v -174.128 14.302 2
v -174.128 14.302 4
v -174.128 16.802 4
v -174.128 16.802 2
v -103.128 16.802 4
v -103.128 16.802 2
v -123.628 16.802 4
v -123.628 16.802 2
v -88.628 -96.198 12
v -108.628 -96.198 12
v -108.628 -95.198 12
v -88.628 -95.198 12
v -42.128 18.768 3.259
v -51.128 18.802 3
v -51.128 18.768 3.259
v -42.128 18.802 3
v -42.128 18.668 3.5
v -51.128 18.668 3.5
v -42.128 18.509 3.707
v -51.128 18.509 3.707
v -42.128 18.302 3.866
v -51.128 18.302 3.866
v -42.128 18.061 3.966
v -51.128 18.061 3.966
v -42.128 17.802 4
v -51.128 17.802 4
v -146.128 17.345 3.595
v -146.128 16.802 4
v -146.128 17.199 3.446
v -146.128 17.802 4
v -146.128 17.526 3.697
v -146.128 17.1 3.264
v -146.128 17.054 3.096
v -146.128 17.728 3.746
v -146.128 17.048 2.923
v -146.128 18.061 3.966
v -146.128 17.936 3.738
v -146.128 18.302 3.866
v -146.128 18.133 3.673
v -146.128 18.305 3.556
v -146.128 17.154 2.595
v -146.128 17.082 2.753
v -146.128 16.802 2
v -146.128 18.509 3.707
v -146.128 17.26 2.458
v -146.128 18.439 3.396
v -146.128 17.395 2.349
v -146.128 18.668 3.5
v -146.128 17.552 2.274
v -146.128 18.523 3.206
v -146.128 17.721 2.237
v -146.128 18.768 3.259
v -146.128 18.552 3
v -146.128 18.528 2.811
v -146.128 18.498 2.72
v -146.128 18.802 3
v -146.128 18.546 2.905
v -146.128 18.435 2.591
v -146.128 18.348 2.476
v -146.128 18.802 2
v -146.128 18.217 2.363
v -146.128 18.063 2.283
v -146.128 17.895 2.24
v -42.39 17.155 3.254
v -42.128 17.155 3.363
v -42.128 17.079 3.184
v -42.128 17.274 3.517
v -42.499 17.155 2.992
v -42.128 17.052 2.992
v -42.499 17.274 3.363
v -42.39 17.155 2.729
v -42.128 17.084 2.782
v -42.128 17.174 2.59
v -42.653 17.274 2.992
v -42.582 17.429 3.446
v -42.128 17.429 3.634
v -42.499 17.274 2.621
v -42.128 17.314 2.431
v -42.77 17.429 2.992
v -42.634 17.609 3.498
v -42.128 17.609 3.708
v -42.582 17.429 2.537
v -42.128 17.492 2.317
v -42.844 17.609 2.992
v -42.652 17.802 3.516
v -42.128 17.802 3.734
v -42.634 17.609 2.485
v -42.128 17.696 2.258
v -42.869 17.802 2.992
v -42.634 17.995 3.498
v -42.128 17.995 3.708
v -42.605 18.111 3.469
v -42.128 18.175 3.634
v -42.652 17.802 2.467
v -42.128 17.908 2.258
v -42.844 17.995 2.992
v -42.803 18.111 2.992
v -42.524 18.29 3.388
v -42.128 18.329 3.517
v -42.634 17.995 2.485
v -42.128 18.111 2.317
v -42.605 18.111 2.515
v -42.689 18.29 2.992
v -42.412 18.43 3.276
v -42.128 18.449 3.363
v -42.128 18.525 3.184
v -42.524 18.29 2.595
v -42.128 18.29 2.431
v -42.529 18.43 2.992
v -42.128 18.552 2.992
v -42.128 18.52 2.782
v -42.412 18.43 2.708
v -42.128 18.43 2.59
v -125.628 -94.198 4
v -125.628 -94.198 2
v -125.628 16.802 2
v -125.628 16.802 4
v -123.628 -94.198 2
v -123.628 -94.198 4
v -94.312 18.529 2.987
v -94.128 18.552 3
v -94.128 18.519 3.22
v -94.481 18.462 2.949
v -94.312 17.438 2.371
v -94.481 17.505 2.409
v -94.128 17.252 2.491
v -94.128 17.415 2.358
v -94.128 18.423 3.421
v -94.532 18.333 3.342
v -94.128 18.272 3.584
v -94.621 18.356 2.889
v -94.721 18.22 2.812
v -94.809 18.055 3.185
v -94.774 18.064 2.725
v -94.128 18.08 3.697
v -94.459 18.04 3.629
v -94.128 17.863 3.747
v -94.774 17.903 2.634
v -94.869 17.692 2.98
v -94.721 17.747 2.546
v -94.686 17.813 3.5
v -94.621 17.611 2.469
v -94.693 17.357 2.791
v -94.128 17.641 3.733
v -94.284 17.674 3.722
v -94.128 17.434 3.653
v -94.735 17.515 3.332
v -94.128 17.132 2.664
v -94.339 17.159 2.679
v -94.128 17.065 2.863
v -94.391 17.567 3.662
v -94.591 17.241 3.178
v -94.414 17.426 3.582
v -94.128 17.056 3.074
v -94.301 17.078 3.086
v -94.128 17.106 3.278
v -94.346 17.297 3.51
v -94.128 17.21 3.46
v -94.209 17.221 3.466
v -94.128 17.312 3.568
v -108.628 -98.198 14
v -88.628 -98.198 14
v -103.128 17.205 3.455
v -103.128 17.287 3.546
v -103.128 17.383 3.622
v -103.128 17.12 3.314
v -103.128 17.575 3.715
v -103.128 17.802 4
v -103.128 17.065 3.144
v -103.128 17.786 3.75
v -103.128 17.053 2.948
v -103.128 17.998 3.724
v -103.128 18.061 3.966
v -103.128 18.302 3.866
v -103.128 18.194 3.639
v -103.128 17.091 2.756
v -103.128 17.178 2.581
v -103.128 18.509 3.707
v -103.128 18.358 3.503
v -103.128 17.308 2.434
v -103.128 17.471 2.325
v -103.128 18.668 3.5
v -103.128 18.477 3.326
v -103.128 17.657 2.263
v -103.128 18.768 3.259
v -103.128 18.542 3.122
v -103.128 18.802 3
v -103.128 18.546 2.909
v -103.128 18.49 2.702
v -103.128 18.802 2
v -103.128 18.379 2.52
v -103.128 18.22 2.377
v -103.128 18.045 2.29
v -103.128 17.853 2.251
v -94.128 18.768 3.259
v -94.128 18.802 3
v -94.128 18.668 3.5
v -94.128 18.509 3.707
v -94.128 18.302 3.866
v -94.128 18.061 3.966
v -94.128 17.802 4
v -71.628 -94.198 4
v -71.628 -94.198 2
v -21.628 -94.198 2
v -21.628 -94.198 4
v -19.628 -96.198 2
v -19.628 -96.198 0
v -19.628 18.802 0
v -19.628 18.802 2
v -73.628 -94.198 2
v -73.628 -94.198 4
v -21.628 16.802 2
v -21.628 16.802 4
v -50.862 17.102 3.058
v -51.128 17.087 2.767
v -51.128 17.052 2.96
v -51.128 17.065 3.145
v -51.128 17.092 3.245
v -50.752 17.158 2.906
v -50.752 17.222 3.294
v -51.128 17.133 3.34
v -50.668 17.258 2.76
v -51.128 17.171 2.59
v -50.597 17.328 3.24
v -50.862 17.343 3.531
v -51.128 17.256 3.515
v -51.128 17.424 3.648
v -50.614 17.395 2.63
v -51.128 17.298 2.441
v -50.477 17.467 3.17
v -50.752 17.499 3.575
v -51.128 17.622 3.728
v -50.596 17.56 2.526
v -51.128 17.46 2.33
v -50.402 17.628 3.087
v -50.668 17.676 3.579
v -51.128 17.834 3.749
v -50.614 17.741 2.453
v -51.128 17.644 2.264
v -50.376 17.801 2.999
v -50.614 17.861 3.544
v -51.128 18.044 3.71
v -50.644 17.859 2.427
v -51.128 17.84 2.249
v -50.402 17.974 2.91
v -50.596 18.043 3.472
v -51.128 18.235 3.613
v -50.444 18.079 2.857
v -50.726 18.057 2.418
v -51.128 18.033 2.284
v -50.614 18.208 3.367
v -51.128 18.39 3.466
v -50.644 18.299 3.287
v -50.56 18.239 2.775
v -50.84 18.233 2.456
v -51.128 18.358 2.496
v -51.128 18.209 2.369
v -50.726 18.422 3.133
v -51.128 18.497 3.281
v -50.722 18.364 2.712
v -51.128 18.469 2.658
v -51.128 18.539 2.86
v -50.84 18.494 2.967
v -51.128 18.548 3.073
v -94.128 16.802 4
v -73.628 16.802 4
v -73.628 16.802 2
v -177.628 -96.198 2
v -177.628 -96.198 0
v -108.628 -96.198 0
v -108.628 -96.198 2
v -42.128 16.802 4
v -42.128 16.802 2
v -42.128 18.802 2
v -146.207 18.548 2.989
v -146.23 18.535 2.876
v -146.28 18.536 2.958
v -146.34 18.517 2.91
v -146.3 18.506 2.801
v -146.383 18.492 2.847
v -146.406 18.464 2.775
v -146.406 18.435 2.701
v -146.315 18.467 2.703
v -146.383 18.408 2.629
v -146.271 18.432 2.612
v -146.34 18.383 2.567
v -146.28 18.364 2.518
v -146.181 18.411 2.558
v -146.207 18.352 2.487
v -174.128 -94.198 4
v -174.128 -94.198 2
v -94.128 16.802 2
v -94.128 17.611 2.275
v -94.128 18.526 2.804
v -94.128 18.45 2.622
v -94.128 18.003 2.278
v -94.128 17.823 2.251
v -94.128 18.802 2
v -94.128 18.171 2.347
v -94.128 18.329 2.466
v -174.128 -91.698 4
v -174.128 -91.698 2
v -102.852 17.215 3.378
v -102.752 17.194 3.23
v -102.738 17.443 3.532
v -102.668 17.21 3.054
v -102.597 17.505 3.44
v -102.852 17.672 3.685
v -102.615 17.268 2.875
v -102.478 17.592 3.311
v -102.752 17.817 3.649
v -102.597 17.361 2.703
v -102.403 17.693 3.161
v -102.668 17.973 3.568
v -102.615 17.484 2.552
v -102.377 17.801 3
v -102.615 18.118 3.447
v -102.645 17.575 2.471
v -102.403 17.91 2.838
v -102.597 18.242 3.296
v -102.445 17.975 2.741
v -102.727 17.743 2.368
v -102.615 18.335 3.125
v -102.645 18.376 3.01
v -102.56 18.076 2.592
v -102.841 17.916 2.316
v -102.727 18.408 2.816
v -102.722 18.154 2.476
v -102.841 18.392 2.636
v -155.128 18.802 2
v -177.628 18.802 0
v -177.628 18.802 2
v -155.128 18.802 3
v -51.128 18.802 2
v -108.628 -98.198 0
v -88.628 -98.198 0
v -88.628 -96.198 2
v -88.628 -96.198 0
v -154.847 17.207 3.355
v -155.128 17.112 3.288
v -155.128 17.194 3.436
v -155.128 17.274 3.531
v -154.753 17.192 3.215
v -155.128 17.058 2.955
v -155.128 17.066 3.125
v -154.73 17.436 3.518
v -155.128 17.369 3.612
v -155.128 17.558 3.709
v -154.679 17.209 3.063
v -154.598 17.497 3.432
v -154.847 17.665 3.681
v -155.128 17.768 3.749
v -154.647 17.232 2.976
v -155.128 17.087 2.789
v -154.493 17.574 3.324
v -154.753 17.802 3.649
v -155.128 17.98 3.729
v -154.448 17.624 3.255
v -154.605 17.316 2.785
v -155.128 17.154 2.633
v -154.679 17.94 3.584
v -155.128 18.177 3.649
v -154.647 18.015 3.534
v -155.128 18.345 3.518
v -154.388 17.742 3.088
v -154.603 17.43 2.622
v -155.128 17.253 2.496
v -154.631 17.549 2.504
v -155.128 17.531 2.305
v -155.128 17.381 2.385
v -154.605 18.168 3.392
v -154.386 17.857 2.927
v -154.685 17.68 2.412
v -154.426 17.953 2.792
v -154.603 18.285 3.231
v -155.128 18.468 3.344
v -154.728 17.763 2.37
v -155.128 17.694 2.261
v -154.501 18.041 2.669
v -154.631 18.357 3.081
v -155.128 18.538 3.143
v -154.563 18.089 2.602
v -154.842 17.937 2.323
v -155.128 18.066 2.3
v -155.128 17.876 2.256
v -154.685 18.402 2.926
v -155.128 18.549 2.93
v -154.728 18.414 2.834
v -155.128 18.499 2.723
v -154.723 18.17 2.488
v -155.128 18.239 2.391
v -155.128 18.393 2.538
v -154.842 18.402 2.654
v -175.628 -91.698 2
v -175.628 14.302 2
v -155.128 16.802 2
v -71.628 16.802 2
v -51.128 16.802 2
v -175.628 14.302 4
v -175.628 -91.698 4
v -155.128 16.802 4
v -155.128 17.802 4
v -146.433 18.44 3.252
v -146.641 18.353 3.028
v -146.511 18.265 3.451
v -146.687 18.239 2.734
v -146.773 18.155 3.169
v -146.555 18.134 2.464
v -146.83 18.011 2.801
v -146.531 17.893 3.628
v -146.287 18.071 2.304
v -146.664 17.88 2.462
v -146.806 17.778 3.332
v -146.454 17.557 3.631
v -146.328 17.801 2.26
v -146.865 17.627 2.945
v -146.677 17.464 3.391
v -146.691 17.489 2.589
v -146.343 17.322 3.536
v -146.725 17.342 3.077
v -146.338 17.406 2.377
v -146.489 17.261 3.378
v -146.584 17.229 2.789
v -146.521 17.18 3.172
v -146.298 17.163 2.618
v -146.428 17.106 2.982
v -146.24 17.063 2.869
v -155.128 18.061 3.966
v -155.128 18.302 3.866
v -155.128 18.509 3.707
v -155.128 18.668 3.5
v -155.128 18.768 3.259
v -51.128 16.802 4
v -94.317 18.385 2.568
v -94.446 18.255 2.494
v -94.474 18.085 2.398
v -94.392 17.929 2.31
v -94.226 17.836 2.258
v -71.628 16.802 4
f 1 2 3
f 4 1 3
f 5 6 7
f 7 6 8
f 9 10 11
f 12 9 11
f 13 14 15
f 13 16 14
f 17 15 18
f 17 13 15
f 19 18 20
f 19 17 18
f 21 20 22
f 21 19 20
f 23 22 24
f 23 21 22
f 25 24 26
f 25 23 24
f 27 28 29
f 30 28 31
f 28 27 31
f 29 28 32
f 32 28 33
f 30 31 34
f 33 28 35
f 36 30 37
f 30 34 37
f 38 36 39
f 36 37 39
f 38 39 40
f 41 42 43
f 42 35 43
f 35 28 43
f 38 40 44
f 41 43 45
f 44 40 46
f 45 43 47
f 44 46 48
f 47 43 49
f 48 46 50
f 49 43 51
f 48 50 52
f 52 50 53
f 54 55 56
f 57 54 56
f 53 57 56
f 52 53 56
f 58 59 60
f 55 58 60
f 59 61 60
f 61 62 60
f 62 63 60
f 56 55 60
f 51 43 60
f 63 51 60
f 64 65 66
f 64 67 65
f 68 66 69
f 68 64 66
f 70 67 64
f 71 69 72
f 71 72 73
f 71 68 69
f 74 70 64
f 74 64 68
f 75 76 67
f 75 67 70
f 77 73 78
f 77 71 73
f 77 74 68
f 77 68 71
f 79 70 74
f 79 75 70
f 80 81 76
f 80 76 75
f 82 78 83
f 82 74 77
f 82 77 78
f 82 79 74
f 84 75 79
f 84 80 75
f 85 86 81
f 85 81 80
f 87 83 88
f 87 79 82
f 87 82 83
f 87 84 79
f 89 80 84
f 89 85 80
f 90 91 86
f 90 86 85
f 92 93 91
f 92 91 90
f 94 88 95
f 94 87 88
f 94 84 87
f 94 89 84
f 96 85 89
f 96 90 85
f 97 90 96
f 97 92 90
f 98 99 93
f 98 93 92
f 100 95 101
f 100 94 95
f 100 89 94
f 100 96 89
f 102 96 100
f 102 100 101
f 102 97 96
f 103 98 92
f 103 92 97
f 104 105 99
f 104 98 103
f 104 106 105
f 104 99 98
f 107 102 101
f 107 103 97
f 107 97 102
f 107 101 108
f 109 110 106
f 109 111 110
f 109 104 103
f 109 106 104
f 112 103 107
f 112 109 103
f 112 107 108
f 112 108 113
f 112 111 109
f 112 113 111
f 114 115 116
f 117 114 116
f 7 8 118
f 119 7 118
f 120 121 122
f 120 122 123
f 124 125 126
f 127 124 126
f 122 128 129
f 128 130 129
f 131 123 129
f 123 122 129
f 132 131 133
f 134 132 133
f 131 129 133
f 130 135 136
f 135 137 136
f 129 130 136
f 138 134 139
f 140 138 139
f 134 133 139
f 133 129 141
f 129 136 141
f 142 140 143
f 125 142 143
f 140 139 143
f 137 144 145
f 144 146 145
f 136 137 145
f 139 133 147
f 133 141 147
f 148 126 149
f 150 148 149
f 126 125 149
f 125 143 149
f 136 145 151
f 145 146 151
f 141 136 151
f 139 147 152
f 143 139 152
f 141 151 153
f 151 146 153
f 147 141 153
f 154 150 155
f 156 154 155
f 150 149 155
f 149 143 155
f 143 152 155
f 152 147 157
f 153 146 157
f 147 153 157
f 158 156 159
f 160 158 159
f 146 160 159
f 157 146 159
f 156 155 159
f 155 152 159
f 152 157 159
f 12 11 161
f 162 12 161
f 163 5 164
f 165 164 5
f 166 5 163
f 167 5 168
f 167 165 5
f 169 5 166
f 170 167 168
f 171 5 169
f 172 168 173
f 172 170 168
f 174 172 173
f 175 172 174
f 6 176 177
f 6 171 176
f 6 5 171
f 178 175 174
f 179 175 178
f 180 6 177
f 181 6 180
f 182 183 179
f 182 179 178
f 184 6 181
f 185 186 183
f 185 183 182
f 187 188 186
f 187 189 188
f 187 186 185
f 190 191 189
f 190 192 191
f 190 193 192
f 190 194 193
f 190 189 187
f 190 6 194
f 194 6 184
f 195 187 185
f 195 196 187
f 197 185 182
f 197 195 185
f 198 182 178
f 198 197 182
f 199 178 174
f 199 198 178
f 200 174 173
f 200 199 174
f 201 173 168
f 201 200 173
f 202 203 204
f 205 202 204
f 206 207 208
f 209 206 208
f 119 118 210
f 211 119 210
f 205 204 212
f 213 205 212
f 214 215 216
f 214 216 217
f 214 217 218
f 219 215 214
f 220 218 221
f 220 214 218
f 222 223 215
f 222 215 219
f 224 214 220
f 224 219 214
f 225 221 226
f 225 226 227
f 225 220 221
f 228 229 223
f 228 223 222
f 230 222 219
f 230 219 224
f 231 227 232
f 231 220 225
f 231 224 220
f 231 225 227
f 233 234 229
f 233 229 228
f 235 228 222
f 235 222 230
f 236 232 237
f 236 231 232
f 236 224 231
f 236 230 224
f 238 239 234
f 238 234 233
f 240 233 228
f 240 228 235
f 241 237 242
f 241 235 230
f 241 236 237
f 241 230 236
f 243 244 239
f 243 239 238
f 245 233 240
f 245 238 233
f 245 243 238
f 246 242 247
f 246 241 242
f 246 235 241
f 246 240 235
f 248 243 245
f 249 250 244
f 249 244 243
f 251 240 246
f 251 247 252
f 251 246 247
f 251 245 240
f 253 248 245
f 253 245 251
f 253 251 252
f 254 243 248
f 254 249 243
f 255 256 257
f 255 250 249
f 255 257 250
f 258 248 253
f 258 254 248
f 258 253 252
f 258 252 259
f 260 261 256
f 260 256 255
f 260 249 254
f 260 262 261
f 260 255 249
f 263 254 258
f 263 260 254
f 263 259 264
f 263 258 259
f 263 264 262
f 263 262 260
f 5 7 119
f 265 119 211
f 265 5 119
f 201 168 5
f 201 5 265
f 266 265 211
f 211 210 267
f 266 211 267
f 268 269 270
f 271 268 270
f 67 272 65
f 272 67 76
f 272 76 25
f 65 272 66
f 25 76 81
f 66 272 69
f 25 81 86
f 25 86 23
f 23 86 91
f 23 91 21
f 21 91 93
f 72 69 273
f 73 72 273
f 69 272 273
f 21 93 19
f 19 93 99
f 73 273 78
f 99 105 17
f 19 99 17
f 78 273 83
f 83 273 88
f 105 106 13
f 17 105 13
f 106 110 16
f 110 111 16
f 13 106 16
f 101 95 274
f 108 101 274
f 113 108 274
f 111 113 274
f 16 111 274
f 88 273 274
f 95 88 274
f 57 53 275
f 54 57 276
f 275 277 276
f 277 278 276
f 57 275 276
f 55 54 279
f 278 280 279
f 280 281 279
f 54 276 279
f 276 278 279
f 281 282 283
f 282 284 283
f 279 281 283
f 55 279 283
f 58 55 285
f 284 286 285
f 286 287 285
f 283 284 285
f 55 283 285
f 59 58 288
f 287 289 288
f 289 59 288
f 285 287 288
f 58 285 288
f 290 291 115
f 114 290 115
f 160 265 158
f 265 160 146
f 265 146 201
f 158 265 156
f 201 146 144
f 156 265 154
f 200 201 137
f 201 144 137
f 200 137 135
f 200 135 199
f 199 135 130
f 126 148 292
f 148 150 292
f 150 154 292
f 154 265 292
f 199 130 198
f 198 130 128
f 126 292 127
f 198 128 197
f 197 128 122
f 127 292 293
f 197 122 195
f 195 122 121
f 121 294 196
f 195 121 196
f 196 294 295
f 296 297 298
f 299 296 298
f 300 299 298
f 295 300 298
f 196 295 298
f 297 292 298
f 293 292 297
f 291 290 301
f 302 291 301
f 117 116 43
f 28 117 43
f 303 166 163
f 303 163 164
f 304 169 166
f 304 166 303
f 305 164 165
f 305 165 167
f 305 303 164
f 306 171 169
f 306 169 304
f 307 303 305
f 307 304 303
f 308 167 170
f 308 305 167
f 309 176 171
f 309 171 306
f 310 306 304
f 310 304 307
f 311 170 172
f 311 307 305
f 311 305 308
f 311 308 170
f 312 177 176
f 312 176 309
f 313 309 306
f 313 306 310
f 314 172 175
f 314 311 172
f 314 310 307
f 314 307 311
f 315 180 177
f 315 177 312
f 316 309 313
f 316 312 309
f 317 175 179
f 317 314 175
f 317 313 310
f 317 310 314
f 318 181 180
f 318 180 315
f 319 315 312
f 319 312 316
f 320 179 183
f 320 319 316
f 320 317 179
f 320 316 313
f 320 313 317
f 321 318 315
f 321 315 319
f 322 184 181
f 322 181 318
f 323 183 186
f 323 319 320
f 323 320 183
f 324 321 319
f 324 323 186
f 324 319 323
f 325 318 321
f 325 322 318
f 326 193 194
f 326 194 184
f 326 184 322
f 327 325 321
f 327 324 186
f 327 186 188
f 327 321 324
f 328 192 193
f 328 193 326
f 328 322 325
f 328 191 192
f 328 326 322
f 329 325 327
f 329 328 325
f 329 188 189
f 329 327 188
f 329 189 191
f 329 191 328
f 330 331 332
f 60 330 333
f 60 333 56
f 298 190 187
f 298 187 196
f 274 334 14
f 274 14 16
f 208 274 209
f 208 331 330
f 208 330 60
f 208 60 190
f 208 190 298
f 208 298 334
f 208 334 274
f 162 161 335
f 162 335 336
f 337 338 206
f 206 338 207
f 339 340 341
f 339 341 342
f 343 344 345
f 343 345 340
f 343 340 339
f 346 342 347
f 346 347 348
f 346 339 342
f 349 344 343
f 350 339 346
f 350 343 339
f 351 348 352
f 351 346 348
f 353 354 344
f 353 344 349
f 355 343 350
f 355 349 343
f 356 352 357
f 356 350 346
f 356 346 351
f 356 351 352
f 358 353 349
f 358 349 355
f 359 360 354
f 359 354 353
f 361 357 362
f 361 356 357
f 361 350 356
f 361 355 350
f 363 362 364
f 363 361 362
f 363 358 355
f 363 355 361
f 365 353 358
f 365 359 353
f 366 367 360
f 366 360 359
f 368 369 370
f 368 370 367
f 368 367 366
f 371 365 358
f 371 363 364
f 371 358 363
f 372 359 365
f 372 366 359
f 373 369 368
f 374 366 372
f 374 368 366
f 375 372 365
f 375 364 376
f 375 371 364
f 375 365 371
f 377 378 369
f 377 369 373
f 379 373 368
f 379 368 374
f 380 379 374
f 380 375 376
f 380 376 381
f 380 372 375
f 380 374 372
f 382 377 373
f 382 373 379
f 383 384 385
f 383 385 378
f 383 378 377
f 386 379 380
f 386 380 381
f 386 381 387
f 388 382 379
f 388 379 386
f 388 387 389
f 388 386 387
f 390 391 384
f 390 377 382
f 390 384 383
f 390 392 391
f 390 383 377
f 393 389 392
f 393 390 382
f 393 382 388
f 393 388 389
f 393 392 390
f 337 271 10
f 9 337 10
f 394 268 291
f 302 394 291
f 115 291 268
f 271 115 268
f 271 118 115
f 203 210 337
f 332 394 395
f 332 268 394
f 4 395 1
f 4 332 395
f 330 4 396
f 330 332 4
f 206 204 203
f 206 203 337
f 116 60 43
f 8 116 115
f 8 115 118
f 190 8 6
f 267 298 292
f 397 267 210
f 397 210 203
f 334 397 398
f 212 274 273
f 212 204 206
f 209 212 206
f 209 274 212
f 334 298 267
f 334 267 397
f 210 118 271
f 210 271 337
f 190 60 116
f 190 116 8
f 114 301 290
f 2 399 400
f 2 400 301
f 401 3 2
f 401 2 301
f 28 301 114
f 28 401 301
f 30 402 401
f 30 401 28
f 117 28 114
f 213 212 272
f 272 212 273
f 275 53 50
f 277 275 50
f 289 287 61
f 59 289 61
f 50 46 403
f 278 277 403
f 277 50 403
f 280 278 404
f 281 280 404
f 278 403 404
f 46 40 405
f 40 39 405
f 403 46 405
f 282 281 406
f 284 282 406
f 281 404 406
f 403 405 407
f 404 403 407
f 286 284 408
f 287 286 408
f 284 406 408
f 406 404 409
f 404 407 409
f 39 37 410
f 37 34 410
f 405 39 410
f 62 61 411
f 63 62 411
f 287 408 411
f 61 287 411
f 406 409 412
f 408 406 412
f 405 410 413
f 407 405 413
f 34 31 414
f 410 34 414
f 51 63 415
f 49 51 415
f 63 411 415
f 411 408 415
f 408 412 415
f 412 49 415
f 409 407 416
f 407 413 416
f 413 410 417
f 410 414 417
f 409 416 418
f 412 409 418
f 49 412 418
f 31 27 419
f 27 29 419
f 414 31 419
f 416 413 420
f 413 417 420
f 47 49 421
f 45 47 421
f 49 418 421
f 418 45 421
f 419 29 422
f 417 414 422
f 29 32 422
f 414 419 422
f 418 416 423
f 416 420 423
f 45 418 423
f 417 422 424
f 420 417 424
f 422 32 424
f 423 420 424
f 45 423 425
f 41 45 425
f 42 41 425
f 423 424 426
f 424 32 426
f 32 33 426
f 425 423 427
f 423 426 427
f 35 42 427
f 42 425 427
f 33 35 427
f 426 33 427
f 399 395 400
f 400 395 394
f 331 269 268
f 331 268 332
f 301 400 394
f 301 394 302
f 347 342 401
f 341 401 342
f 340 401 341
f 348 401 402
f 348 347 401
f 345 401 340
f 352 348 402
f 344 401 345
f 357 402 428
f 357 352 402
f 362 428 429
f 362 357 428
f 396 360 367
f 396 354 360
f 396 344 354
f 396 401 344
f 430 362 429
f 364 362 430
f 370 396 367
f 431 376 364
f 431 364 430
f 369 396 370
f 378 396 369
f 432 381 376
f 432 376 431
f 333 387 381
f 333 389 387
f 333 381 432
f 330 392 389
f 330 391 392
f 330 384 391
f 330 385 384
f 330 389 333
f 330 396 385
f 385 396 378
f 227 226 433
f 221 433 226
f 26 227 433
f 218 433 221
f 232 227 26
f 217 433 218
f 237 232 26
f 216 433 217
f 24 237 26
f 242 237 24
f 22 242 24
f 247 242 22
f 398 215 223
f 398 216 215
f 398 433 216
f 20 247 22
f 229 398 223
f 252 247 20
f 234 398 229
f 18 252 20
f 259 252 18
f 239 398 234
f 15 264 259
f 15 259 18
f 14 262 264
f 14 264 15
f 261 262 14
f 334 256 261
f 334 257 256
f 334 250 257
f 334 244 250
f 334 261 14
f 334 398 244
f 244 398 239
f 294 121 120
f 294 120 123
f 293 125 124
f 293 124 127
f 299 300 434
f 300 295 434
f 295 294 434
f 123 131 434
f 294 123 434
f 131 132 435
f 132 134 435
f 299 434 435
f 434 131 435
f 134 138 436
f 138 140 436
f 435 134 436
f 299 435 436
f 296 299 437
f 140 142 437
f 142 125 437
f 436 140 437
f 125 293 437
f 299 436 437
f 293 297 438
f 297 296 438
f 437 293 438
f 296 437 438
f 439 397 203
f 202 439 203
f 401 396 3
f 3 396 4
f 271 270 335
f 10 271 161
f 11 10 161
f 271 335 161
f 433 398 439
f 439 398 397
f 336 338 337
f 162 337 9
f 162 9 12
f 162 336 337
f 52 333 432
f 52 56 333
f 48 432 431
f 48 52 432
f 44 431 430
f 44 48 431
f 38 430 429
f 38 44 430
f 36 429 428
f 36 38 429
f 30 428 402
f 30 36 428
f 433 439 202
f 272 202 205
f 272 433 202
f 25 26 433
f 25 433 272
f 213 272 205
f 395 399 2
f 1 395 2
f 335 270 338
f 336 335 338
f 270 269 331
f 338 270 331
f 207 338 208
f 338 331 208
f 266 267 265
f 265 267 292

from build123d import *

# Parameters (mm, degrees)
F0_W      = 158
F0_H      = 115
F1_DEPTH  = 2
F2_W      = 9
F2_H      = 2
F3_DEPTH  = 2
F4_R      = 1
F17_W     = 1.5
F17_H     = 2.5
F18_DEPTH = 2
F19_W     = 20
F19_H     = 14
F20_DEPTH = 2
F22_DEPTH = 25


with BuildPart() as f1:
    # F0 (on Top) → F1 (new body)
    with BuildSketch(Plane.XY):
        with Locations((-98.6276573709, -38.6981162429)):
            Rectangle(F0_W, F0_H)
    extrude(amount=F1_DEPTH)

    # F2 (on face) → F3 (join)
    with BuildSketch(Plane.XY.offset(2)):
        Polygon((-155.1276573709, 16.8018837571), (-175.6276573709, 16.8018837571), (-175.6276573709, -94.1981162429), (-125.6276573709, -94.1981162429), (-125.6276573709, 16.8018837571), (-146.1276573709, 16.8018837571), align=None)
        with Locations((-150.6276573709, 17.8018837571)):
            Rectangle(F2_W, F2_H)
        Polygon((-103.1276573709, 16.8018837571), (-123.6276573709, 16.8018837571), (-123.6276573709, -94.1981162429), (-73.6276573709, -94.1981162429), (-73.6276573709, 16.8018837571), (-94.1276573709, 16.8018837571), align=None)
        with Locations((-98.6276573709, 17.8018837571)):
            Rectangle(F2_W, F2_H)
        Polygon((-51.1276573709, 16.8018837571), (-71.6276573709, 16.8018837571), (-71.6276573709, -94.1981162429), (-21.6276573709, -94.1981162429), (-21.6276573709, 16.8018837571), (-42.1276573709, 16.8018837571), align=None)
        with Locations((-46.6276573709, 17.8018837571)):
            Rectangle(F2_W, F2_H)
    extrude(amount=F3_DEPTH)

    # F4
    f4_edges = [f1.edges().sort_by_distance(p)[0] for p in [
        (-150.627657, 18.801884, 4),
        (-98.627657, 18.801884, 4),
        (-46.627657, 18.801884, 4),
    ]]
    fillet(f4_edges, radius=F4_R)

    # F5 (on face) → F6 (revolve, cut)
    with BuildSketch(Plane(origin=(-155.1276573709, 0, 0), x_dir=(0, -1, 0), z_dir=(-1, 0, 0))):
        with BuildLine():
            Line((-18.2392987821, 2.3907643347), (-17.368703077, 3.6122536226))
            ThreePointArc((-17.368703077, 3.6122536226), (-18.4126320707, 3.435300468), (-18.2392987821, 2.3907643347))
        make_face()
    revolve(axis=Axis((-155.1276573709, 17.8040009295, 3.0015089786), (0, -0.580400624, 0.8143310848)), mode=Mode.SUBTRACT)

    # F7 (on face) → F8 (revolve, cut)
    with BuildSketch(Plane.YZ.offset(-146.1276573709)):
        with BuildLine():
            ThreePointArc((18.497534939, 2.719697604), (18.5381711964, 2.8572386368), (18.5518837571, 3))
            ThreePointArc((18.5518837571, 3), (17.9358816289, 3.7379326327), (17.0997649028, 3.2636837395))
            Line((17.0997649028, 3.2636837395), (18.497534939, 2.719697604))
        make_face()
    revolve(axis=Axis((-146.1276573709, 17.7986499209, 2.9916906717), (0, -0.9319125504, 0.362683055)), mode=Mode.SUBTRACT)

    # F9 (on face) → F10 (revolve, cut)
    with BuildSketch(Plane(origin=(-103.1276573709, 0, 0), x_dir=(0, -1, 0), z_dir=(-1, 0, 0))):
        with BuildLine():
            Line((-18.2199622799, 2.3773360868), (-17.3826746537, 3.6219033105))
            ThreePointArc((-17.3826746537, 3.6219033105), (-18.4241676257, 3.4186439858), (-18.2199622799, 2.3773360868))
        make_face()
    revolve(axis=Axis((-103.1276573709, 17.8013184668, 2.9996196986), (0, -0.5581919811, 0.8297118248)), mode=Mode.SUBTRACT)

    # F11 (on face) → F12 (revolve, cut)
    with BuildSketch(Plane.YZ.offset(-94.1276573709)):
        with BuildLine():
            ThreePointArc((18.1709835579, 2.3471100115), (18.4496973301, 2.6220614141), (18.5518837571, 3))
            ThreePointArc((18.5518837571, 3), (18.1802362306, 3.647571931), (17.4336186749, 3.6533611782))
            Line((17.4336186749, 3.6533611782), (18.1709835579, 2.3471100115))
        make_face()
    revolve(axis=Axis((-94.1276573709, 17.8023011164, 3.0002355949), (0, -0.4915766891, 0.8708342889)), mode=Mode.SUBTRACT)

    # F13 (on face) → F14 (revolve, cut)
    with BuildSketch(Plane(origin=(-51.1276573709, 0, 0), x_dir=(0, -1, 0), z_dir=(-1, 0, 0))):
        with BuildLine():
            Line((-18.4692159742, 2.6577023049), (-17.133300999, 3.3398486363))
            ThreePointArc((-17.133300999, 3.3398486363), (-18.1429574959, 3.66795861), (-18.4692159742, 2.6577023049))
        make_face()
    revolve(axis=Axis((-51.1276573709, 17.8012584866, 2.9987754706), (0, -0.89061148, 0.4547649851)), mode=Mode.SUBTRACT)

    # F15 (on face) → F16 (revolve, cut)
    with BuildSketch(Plane.YZ.offset(-42.1276573709)):
        with BuildLine():
            Line((18.5518387793, 2.9917863059), (17.051928735, 2.9917863059))
            ThreePointArc((17.051928735, 2.9917863059), (17.8018837571, 2.25), (18.5518387793, 2.9917863059))
        make_face()
    revolve(axis=Axis((-42.1276573709, 17.8018837571, 2.9917863059), (0, -1, 0)), mode=Mode.SUBTRACT)

    # F17 (on face) → F18 (cut)
    with BuildSketch(Plane.XY.offset(4)):
        with Locations((-174.8776573709, 15.5518837571)):
            Rectangle(F17_W, F17_H)
        with Locations((-174.8776573709, -92.9481162429)):
            Rectangle(F17_W, F17_H)
    extrude(amount=-F18_DEPTH, mode=Mode.SUBTRACT)

    # F19 (on face) → F20 (join, symmetric)
    with BuildSketch(Plane.XZ.offset(96.1981162429)):
        with Locations((-98.6276573709, 7)):
            Rectangle(F19_W, F19_H)
    extrude(amount=F20_DEPTH, both=True)

    # F21 (on face) → F22 (cut)
    with BuildSketch(Plane(origin=(-108.6276573709, 0, 0), x_dir=(0, -1, 0), z_dir=(-1, 0, 0))):
        Polygon((94.1981162429, 12), (94.1981162429, 2), (96.1981162429, 2), (96.1981162429, 12), (95.1981162429, 12), align=None)
        Polygon((94.1981162429, 14), (94.1981162429, 12), (95.1981162429, 12), (98.1981162429, 14), align=None)
    extrude(amount=-F22_DEPTH, mode=Mode.SUBTRACT)


solid = f1.part
